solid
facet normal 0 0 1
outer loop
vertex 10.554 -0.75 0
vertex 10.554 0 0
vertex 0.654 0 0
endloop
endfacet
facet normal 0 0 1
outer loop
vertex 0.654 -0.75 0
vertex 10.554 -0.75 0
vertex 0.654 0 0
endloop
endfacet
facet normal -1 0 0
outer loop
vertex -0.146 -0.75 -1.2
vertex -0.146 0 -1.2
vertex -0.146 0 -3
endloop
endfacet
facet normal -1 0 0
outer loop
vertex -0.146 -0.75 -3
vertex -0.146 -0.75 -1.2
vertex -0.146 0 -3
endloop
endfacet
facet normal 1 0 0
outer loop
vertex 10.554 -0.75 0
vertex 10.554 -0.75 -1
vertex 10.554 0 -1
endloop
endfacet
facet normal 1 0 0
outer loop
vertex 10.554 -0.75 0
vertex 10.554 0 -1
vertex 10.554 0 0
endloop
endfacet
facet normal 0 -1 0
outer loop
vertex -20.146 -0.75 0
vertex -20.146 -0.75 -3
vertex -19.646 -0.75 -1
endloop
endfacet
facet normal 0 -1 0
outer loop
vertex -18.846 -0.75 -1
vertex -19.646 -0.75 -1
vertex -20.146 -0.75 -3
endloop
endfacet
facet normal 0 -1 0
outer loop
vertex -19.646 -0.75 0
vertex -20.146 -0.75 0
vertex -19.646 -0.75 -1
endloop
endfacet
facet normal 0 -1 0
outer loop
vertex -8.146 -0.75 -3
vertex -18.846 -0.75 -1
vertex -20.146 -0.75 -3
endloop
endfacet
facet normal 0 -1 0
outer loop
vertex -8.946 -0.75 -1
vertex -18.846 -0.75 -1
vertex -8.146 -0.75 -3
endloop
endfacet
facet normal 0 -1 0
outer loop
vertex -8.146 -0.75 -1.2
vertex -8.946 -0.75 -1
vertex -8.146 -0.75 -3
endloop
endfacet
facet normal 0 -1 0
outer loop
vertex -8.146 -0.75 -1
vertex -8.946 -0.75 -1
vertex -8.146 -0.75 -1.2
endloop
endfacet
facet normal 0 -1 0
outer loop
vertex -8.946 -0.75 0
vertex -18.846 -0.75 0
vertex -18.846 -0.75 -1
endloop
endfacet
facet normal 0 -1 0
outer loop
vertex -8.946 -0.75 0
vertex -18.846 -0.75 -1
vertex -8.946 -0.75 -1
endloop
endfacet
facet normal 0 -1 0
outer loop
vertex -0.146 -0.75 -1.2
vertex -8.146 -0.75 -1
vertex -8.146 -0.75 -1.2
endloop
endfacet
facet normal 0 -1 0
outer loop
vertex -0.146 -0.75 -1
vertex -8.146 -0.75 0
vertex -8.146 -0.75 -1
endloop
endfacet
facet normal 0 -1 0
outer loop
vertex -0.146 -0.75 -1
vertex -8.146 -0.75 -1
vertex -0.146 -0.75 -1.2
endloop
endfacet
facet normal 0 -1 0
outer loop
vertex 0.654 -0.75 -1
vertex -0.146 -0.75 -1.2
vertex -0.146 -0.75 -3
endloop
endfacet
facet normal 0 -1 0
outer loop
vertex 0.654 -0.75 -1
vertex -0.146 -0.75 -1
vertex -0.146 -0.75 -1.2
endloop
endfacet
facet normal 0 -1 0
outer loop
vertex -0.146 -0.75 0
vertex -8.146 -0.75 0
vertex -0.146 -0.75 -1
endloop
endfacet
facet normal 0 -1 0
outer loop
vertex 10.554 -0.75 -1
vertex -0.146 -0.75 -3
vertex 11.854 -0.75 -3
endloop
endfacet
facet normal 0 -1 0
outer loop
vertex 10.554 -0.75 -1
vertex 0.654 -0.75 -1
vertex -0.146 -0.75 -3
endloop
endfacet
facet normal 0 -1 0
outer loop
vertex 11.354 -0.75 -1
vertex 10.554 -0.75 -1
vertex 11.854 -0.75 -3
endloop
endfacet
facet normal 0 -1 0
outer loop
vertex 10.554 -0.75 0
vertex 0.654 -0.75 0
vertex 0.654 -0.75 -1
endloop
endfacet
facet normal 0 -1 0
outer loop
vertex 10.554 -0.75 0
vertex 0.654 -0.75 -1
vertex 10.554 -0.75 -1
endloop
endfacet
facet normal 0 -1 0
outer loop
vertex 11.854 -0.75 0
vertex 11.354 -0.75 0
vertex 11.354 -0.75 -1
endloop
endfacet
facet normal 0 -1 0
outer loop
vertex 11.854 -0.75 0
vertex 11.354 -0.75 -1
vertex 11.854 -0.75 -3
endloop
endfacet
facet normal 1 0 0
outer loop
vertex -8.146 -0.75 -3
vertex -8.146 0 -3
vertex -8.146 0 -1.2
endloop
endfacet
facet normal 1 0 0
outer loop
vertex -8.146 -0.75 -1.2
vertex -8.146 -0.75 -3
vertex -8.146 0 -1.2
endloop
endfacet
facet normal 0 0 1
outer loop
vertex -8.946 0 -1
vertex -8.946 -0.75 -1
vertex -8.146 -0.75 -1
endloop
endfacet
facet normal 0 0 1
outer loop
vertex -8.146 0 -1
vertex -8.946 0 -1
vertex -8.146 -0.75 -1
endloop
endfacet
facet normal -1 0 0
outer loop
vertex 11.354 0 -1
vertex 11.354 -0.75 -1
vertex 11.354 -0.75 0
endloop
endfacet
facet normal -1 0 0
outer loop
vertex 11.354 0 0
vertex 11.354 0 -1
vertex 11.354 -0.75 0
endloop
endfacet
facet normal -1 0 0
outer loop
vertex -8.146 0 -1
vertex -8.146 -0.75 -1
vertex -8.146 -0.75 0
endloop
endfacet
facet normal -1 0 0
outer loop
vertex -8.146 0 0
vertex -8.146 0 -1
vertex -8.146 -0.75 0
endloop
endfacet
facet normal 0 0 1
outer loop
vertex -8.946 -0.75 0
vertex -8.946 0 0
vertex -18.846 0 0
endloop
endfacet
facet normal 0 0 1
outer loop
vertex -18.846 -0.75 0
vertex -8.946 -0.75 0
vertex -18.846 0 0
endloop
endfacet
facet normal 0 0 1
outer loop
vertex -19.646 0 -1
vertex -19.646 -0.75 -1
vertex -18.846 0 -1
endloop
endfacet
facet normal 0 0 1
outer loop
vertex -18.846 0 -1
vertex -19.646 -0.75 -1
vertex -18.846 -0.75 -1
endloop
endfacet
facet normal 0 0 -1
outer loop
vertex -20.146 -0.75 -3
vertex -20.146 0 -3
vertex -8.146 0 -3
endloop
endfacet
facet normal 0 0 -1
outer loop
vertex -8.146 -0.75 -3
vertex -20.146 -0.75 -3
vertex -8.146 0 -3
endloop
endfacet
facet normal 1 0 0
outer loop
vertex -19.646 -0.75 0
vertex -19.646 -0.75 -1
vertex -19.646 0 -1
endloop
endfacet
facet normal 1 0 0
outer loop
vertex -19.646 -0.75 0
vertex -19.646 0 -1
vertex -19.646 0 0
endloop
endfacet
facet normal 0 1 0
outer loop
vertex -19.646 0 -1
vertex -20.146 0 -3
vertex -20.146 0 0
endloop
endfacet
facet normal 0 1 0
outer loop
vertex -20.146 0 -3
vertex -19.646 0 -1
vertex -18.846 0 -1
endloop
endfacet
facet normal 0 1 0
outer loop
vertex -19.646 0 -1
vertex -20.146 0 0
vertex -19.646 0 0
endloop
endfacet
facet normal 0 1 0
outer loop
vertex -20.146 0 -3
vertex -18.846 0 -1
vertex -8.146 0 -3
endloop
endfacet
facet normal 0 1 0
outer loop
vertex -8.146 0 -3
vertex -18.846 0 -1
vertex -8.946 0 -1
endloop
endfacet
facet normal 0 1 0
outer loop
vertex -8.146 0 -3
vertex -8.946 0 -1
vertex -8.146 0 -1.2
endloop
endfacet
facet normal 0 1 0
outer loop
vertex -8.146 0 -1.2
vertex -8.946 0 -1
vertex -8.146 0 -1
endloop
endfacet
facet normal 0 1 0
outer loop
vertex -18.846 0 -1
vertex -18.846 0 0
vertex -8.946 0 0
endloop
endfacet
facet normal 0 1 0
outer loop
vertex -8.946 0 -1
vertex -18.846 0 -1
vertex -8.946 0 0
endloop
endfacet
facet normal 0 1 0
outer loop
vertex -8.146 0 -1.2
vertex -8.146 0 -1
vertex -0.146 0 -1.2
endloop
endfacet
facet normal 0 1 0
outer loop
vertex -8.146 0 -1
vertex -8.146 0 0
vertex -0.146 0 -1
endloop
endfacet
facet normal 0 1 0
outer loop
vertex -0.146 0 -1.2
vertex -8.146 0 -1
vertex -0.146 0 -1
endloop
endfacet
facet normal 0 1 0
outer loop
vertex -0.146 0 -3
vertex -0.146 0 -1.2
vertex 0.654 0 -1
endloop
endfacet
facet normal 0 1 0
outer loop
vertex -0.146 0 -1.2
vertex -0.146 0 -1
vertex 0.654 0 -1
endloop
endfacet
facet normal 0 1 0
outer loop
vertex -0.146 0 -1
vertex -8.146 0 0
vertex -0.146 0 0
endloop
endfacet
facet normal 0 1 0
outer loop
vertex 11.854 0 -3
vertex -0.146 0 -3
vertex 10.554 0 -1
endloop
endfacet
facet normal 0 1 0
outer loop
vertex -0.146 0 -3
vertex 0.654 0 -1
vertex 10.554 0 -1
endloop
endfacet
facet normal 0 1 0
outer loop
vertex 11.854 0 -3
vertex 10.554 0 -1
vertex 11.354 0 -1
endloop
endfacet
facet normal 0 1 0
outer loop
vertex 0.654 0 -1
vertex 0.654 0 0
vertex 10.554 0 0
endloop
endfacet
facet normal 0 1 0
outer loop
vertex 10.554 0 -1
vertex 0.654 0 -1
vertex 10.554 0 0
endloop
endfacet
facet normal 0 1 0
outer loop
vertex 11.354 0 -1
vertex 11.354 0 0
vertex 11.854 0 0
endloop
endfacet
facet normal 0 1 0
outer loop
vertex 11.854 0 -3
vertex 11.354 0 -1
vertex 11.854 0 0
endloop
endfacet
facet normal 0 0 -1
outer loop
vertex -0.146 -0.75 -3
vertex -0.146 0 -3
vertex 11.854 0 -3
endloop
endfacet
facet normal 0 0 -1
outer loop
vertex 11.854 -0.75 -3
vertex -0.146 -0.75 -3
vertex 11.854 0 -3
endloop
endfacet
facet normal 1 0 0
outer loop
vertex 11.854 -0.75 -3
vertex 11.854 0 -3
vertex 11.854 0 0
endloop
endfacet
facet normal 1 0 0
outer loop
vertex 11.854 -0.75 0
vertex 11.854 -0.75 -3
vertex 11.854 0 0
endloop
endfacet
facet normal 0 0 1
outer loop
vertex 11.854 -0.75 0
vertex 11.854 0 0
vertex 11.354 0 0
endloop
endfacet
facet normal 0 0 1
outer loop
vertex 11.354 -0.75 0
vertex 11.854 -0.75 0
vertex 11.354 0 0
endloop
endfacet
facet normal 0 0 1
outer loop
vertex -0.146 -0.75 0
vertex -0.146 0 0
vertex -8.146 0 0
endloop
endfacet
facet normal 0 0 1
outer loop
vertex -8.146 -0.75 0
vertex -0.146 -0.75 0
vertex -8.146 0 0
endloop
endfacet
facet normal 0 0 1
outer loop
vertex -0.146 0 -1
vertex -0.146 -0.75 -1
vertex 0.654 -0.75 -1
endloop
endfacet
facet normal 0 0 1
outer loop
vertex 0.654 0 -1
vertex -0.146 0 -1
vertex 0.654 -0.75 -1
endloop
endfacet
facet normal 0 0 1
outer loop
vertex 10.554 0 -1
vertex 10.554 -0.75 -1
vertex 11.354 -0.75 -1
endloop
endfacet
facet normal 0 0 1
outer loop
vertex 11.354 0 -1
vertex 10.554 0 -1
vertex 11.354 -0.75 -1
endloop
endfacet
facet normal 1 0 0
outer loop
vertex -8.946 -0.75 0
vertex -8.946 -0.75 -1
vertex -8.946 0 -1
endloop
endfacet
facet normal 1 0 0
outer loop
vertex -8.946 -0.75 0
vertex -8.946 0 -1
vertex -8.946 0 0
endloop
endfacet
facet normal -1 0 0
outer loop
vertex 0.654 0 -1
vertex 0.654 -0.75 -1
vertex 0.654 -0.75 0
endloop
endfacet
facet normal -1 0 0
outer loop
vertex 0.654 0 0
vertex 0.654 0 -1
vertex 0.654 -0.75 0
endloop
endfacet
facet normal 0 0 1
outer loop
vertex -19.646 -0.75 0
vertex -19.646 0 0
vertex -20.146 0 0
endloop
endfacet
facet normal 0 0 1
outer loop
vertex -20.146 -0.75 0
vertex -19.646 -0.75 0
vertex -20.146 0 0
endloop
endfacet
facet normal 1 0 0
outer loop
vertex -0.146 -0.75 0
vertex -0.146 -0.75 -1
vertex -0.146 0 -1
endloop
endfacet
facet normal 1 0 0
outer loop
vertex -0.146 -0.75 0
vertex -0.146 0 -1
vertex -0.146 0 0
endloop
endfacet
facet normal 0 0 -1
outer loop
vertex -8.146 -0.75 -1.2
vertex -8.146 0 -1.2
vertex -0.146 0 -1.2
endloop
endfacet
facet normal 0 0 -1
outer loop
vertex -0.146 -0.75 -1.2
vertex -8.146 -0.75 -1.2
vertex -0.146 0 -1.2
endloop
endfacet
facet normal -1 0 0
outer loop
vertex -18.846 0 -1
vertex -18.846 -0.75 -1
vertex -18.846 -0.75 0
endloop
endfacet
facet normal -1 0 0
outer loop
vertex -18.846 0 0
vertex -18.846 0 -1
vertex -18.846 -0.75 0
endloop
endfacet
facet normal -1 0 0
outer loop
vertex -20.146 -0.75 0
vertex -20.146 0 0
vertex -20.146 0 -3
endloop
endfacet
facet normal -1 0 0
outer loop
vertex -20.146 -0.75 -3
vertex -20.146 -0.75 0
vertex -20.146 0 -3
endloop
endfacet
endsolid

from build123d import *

# Parameters (mm, degrees)
F1_DEPTH = 0.75
F2_W     = 0.8
F2_H     = 1
F3_DEPTH = 0.751
F4_W     = 0.8
F4_H     = 1
F5_DEPTH = 0.751
F6_W     = 0.8
F6_H     = 1
F7_DEPTH = 0.751
F8_W     = 0.8
F8_H     = 1
F9_DEPTH = 0.751


with BuildPart() as f1:
    # F0 (on Front) → F1 (new body)
    with BuildSketch(Plane.XZ):
        Polygon((11.8536589885, 0), (-20.1463410115, 0), (-20.1463410115, -3), (-8.1463410115, -3), (-8.1463410115, -1.2), (-0.1463410115, -1.2), (-0.1463410115, -3), (11.8536589885, -3), align=None)
    extrude(amount=F1_DEPTH)

    # F2 (on face) → F3 (cut, through all)
    with BuildSketch(Plane.XZ.offset(0.75)):
        with Locations((-19.2463410115, -0.5)):
            Rectangle(F2_W, F2_H)
    extrude(amount=-F3_DEPTH, mode=Mode.SUBTRACT)

    # F4 (on face) → F5 (cut, through all)
    with BuildSketch(Plane.XZ.offset(0.75)):
        with Locations((-8.5463410115, -0.5)):
            Rectangle(F4_W, F4_H)
    extrude(amount=-F5_DEPTH, mode=Mode.SUBTRACT)

    # F6 (on face) → F7 (cut, through all)
    with BuildSketch(Plane.XZ.offset(0.75)):
        with Locations((0.2536589885, -0.5)):
            Rectangle(F6_W, F6_H)
    extrude(amount=-F7_DEPTH, mode=Mode.SUBTRACT)

    # F8 (on face) → F9 (cut, through all)
    with BuildSketch(Plane.XZ.offset(0.75)):
        with Locations((10.9536589885, -0.5)):
            Rectangle(F8_W, F8_H)
    extrude(amount=-F9_DEPTH, mode=Mode.SUBTRACT)


solid = f1.part
